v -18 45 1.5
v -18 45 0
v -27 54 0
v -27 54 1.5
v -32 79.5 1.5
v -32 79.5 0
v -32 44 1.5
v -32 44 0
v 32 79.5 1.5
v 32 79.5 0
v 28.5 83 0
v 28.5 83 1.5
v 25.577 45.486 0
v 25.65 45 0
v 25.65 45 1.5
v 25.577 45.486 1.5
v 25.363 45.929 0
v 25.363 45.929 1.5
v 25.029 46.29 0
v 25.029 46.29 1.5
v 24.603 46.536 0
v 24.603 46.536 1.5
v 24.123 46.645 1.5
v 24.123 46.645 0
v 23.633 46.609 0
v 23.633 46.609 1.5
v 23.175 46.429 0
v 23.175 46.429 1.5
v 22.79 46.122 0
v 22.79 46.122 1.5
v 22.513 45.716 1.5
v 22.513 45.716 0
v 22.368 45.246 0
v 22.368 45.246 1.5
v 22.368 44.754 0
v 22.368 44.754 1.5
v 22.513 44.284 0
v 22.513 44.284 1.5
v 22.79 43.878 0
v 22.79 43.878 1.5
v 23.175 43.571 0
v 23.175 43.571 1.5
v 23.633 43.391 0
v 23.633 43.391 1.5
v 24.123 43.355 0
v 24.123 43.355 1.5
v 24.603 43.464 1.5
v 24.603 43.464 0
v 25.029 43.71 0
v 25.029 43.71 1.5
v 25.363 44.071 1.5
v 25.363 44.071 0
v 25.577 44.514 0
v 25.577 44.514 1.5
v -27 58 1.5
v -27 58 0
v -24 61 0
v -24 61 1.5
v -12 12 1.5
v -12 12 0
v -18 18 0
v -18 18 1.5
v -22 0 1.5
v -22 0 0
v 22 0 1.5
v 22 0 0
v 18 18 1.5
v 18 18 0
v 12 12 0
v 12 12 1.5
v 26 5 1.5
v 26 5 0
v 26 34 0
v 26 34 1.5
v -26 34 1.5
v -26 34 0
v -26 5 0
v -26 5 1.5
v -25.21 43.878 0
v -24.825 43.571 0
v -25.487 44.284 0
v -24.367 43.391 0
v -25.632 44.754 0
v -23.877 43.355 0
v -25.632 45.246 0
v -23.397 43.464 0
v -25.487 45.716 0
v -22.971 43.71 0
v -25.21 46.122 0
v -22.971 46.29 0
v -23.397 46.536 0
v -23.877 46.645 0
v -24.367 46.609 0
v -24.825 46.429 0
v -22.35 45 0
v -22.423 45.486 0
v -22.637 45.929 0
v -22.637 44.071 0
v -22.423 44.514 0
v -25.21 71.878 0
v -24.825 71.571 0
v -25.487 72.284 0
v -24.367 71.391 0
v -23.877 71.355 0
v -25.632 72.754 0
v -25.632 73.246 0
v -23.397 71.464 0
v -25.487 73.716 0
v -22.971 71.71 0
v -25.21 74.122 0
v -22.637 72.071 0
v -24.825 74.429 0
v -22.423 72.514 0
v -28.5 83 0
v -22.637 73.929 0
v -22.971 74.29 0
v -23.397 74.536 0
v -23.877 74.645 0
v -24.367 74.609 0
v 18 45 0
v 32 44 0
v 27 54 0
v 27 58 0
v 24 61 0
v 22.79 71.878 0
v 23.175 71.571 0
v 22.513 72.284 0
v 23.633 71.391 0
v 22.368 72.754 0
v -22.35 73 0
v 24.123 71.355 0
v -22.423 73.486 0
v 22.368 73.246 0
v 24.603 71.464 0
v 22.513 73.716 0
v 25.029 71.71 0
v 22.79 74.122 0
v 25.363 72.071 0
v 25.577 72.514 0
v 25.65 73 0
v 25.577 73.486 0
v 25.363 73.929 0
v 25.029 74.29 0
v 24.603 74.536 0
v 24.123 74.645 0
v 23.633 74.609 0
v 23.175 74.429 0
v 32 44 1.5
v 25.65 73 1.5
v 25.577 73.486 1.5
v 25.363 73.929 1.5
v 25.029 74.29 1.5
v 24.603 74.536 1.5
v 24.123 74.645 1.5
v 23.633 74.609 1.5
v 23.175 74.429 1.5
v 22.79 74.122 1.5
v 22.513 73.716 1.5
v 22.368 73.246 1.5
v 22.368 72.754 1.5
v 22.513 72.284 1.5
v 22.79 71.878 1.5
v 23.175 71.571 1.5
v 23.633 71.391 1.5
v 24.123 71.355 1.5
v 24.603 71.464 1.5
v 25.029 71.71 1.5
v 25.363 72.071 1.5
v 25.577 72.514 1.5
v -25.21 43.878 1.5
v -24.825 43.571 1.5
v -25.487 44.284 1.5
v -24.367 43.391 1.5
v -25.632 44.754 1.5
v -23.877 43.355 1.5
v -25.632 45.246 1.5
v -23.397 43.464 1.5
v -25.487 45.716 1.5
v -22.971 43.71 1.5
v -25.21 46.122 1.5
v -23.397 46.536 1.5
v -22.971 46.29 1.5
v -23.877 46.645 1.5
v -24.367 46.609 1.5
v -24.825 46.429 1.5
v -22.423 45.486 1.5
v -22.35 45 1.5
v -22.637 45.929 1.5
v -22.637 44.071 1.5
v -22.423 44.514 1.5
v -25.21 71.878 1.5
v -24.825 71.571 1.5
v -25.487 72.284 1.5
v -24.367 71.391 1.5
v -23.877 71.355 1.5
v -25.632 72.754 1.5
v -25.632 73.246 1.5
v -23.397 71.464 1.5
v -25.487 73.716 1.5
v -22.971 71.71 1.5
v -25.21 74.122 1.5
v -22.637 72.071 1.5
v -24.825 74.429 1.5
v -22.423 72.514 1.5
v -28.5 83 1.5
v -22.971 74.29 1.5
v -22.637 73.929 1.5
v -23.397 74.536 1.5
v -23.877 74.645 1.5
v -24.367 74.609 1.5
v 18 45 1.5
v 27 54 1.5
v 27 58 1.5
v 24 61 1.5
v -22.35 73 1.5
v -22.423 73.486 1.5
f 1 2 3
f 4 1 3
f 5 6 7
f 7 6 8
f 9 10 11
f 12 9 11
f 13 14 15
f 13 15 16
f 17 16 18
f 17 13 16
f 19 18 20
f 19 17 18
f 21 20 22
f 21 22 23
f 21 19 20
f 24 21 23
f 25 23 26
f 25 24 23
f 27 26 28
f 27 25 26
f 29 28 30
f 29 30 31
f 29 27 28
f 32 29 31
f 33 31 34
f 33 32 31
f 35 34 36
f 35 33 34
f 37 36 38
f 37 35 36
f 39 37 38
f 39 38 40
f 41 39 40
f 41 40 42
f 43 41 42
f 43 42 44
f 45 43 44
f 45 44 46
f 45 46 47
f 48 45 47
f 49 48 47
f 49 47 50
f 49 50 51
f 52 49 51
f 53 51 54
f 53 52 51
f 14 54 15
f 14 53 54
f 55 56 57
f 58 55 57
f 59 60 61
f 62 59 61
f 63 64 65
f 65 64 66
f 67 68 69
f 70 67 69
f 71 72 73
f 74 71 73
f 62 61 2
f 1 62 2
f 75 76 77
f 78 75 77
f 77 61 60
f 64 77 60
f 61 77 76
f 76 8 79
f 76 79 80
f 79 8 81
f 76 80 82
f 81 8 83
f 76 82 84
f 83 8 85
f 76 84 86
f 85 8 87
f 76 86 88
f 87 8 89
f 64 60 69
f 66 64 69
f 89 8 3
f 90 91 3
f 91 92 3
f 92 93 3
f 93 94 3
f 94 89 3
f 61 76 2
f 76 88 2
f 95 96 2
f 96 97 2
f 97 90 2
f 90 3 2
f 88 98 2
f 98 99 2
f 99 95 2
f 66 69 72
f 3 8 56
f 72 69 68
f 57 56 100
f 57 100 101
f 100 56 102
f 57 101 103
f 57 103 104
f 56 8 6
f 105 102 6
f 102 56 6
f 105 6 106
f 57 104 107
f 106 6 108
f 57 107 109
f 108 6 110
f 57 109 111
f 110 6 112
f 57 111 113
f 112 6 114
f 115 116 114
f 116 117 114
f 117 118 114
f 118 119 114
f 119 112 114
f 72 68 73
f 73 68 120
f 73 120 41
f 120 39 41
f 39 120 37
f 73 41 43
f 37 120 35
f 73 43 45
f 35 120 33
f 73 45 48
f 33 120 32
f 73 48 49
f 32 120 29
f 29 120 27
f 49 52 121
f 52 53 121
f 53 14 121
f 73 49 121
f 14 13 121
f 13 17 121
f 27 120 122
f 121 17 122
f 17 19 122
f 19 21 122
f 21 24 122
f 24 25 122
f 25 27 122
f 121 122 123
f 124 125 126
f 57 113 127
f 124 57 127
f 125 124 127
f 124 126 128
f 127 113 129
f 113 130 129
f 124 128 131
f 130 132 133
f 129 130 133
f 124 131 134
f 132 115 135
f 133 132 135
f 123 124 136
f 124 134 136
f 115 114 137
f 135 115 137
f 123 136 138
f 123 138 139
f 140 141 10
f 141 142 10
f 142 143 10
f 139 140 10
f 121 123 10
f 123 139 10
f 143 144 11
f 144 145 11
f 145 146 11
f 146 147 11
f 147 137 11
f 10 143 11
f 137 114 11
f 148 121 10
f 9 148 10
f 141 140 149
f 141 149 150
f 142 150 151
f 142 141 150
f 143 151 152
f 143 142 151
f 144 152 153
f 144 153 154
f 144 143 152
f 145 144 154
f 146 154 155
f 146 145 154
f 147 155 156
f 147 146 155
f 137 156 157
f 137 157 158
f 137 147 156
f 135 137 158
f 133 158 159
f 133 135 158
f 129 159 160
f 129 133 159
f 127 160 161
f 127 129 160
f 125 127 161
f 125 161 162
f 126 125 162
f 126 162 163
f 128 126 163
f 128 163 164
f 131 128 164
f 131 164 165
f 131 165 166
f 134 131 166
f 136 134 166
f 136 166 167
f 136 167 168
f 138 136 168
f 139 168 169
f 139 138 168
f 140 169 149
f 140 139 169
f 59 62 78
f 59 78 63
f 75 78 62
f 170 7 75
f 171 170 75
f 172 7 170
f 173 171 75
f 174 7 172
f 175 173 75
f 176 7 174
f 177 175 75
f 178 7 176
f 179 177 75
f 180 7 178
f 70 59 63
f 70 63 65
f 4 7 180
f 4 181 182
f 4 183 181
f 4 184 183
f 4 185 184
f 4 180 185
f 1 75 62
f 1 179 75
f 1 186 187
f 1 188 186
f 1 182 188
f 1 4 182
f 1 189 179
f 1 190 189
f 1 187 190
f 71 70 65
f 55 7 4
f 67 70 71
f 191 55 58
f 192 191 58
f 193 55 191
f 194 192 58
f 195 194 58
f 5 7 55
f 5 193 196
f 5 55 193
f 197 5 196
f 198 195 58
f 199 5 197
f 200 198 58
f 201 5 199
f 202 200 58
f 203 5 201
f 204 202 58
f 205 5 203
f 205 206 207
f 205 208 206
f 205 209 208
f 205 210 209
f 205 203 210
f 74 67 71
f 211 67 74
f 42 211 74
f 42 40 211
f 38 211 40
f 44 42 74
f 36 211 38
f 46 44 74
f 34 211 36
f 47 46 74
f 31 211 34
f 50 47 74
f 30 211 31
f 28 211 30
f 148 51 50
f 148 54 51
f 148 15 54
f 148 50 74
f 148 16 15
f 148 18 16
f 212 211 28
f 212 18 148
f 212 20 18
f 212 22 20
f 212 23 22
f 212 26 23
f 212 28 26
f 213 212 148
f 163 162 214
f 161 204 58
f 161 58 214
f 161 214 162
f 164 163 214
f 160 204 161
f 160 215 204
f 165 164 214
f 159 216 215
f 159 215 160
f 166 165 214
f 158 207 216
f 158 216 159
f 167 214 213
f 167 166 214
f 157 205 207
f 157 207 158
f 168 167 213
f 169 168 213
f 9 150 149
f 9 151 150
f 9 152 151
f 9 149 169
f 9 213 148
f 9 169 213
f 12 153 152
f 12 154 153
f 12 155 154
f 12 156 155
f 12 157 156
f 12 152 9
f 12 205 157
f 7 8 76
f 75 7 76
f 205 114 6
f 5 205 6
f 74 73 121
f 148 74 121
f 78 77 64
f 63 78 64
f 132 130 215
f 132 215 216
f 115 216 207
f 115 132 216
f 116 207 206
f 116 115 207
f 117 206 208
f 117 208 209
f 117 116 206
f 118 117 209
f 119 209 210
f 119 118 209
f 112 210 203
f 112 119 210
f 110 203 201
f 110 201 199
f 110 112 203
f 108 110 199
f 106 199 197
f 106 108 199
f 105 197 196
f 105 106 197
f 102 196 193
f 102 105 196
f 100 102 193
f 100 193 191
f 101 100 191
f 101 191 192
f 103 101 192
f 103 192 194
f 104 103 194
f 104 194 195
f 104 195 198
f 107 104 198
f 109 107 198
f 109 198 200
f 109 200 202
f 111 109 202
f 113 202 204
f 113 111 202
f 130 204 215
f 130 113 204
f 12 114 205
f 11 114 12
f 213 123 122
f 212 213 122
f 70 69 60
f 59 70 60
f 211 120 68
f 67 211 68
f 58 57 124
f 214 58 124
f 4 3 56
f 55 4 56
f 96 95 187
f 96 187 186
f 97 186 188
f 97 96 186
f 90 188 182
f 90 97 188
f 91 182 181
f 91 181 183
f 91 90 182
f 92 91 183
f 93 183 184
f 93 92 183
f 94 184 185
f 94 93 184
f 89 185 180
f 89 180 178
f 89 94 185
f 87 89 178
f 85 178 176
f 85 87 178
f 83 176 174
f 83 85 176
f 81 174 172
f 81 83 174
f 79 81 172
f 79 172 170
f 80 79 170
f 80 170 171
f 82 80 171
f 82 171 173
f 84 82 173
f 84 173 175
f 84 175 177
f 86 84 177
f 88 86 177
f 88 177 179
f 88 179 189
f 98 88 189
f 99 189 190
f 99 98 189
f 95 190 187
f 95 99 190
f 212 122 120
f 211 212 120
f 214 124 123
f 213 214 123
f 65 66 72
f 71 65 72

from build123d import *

# Parameters (mm, degrees)
SKETCH_1_R            = 1.65
EXTRUDE_267_DEPTH     = 1.5
SKETCH_3_W            = 200
SKETCH_3_H            = 2
CUT_EXTRUDE_0P5_DEPTH = 1.5


with BuildPart() as part:
    # 草图1 → Extrude 267 (new body)
    with BuildSketch(Plane.XY):
        Polygon((-22, 0), (22, 0), (26, 5), (26, 34), (32, 44), (32, 79.5), (28, 83.5), (-28, 83.5), (-32, 79.5), (-32, 44), (-26, 34), (-26, 5), align=None)
        with Locations((-24, 45)):
            Circle(SKETCH_1_R, mode=Mode.SUBTRACT)
        with Locations((24, 45)):
            Circle(SKETCH_1_R, mode=Mode.SUBTRACT)
        with Locations((-24, 73)):
            Circle(SKETCH_1_R, mode=Mode.SUBTRACT)
        with Locations((24, 73)):
            Circle(SKETCH_1_R, mode=Mode.SUBTRACT)
        Polygon((-24, 61), (24, 61), (27, 58), (27, 54), (18, 45), (18, 18), (12, 12), (-12, 12), (-18, 18), (-18, 45), (-27, 54), (-27, 58), align=None, mode=Mode.SUBTRACT)
    extrude(amount=EXTRUDE_267_DEPTH)

    # 草图3 → 底板加厚上沿退让0p5 (cut)
    with BuildSketch(Plane.XY):
        with Locations((0, 84)):
            Rectangle(SKETCH_3_W, SKETCH_3_H)
    extrude(amount=CUT_EXTRUDE_0P5_DEPTH, mode=Mode.SUBTRACT)


solid = part.part
